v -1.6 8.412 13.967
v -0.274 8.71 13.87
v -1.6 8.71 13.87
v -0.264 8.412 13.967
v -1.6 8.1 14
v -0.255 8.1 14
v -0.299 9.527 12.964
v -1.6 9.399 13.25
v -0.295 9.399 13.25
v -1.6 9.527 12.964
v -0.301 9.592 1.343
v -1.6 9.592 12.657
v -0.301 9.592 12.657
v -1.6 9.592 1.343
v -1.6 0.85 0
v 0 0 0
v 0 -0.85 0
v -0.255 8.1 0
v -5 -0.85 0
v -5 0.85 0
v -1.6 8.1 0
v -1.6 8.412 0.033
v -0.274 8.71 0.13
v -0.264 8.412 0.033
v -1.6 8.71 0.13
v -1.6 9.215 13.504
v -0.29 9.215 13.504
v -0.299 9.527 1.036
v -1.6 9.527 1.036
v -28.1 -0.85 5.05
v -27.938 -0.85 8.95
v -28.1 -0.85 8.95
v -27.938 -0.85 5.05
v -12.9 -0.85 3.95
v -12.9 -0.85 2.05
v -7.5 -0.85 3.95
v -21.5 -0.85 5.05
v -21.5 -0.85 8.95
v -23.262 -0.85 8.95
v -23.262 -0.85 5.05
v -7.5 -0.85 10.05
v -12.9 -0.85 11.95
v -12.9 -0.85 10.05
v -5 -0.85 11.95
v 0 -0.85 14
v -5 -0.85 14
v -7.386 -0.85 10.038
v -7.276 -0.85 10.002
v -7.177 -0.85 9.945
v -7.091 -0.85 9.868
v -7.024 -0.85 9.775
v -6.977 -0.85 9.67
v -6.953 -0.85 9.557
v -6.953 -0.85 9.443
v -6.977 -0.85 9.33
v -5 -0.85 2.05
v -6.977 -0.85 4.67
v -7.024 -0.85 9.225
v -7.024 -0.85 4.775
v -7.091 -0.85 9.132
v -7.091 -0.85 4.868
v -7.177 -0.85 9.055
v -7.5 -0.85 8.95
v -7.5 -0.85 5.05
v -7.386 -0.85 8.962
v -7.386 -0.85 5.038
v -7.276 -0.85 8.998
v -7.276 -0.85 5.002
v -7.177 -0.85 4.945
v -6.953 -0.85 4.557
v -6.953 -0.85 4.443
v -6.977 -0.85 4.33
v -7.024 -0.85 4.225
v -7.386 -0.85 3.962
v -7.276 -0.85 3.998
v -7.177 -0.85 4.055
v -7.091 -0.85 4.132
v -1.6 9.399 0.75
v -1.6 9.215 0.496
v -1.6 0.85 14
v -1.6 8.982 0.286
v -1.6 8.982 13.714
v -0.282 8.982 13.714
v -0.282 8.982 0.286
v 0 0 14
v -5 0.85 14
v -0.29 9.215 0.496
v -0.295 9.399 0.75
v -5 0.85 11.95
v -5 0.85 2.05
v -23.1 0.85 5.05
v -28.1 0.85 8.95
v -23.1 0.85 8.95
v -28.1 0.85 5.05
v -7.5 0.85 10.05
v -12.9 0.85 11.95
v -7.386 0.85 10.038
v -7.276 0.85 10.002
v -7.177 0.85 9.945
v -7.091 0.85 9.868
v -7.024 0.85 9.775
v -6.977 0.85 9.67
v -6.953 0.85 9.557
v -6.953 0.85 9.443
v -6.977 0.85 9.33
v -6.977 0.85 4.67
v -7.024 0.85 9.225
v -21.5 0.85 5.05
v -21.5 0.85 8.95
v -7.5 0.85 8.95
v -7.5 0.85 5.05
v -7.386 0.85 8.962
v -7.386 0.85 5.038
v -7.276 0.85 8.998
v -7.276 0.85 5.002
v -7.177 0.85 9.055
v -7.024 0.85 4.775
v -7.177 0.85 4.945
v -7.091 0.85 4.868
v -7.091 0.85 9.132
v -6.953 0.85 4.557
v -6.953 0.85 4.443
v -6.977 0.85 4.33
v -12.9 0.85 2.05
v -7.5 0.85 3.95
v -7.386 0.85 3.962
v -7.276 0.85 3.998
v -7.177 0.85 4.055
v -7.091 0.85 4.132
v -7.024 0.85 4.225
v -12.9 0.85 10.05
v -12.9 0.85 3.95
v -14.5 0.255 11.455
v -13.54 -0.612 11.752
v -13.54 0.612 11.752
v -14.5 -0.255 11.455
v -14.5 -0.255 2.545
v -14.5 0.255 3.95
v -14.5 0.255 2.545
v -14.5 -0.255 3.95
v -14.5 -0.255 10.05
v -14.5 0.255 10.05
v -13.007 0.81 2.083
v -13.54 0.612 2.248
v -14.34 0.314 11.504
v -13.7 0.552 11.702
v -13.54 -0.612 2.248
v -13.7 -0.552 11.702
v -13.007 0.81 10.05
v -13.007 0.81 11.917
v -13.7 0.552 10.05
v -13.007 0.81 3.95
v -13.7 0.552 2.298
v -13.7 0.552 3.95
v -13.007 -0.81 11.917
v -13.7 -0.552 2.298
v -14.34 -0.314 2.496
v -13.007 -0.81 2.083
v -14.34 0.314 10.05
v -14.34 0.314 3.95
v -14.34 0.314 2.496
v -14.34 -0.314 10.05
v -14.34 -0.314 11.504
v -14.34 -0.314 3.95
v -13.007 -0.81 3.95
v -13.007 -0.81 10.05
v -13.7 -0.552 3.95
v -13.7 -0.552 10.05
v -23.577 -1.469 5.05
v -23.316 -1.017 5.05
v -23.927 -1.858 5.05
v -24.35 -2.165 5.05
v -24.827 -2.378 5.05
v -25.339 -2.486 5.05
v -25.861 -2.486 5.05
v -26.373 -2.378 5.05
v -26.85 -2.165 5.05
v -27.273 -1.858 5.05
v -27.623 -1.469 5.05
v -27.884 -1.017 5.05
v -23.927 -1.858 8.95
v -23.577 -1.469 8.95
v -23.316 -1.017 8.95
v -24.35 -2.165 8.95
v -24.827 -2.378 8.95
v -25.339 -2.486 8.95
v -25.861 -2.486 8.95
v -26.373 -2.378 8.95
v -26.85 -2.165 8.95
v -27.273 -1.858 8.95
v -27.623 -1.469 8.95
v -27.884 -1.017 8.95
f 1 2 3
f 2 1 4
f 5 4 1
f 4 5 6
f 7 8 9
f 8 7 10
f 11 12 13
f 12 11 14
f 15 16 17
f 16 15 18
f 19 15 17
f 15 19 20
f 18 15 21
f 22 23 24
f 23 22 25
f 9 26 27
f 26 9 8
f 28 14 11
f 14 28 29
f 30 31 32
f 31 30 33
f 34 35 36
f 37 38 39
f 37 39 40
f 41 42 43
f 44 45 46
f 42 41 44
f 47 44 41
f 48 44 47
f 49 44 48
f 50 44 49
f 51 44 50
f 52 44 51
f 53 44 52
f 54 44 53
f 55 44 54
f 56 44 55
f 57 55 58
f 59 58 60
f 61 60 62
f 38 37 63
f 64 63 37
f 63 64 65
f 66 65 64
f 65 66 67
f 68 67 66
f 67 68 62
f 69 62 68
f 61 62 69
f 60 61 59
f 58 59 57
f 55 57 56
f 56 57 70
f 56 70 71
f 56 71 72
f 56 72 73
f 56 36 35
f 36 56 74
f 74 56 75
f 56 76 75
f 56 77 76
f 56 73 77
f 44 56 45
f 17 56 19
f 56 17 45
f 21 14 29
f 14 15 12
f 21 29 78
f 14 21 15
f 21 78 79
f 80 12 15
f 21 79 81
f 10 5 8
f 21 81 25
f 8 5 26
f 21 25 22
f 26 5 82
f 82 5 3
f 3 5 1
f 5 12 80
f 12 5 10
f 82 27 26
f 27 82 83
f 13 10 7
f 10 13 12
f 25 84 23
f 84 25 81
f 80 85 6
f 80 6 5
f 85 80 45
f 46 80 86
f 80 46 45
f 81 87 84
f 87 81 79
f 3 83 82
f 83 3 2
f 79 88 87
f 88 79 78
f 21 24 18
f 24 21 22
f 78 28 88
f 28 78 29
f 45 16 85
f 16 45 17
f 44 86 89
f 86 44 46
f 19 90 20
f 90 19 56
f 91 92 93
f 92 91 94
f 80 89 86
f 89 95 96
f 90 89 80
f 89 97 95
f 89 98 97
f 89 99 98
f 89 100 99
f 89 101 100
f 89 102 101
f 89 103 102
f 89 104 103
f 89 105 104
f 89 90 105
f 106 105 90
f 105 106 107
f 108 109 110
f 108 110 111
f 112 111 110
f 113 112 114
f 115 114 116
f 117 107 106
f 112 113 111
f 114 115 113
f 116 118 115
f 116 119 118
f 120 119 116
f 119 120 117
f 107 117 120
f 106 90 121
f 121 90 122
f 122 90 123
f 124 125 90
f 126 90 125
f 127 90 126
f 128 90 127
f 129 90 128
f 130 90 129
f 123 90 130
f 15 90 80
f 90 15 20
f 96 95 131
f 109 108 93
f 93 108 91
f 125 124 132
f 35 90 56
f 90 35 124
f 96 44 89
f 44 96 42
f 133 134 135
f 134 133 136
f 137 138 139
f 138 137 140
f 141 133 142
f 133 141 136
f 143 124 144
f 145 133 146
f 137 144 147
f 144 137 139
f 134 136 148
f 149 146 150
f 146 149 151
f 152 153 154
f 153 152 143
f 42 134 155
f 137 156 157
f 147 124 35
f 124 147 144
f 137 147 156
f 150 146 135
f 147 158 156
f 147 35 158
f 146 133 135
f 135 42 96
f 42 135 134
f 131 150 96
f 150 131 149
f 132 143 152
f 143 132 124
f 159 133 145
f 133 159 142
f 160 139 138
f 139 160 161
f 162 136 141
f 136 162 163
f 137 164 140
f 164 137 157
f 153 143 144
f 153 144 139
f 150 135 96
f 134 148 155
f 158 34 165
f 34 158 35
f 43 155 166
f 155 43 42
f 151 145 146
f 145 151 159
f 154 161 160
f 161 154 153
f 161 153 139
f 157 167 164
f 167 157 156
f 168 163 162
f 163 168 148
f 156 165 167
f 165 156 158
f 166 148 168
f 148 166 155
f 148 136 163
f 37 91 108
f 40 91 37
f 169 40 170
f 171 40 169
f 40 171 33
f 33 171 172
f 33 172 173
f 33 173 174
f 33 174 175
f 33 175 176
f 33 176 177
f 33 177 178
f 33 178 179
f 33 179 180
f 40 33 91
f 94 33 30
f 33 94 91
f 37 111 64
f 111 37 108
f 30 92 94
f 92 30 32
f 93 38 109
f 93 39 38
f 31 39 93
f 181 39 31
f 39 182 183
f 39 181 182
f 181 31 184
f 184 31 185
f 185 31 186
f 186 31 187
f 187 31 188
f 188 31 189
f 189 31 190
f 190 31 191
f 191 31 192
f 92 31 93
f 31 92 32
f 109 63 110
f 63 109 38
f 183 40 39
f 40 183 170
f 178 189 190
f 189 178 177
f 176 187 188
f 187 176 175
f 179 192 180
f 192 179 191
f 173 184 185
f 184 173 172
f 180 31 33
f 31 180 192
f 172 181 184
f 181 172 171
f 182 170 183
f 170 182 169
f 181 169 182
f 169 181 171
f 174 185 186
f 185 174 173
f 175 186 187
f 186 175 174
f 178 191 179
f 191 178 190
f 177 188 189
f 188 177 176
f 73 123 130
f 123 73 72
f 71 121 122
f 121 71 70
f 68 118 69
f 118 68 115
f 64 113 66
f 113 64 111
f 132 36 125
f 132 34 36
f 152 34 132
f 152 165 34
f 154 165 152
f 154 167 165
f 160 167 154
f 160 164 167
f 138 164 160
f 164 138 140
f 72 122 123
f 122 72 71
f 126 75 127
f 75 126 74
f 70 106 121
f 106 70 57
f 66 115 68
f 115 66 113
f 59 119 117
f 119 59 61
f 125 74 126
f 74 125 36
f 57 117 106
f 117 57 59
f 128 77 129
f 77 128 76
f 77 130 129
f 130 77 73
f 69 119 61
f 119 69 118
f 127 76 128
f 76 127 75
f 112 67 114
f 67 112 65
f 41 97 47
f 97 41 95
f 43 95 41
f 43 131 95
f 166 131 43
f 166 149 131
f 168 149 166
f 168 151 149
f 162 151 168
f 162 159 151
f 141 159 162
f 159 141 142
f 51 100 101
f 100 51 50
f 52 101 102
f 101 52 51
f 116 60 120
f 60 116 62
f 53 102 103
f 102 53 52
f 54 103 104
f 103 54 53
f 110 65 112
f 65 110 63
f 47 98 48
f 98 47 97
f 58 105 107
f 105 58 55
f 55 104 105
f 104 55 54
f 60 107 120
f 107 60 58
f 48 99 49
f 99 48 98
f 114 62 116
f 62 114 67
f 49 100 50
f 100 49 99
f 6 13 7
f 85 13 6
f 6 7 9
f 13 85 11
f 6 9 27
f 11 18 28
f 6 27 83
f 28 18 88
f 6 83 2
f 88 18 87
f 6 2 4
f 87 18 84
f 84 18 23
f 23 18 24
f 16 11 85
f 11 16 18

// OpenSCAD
// Hinge lock clip for the Macintosh Portable
// Copyright François Revol, 2025

// [Printing]

print_orientation = 1; // [0: vertical - no support but can break, 1: on the side - needs supports]

optimize_fdm = true;

// [Hidden]
$fn=30;

module hinge_clip() {
    difference() {
        union() {
            // handle
            hull() {
                linear_extrude(1.6) square([14,1.7], center=true);
                for(dx = [-1,1])
                    translate([dx*(14/2-1.5),9.7-1.7/2-1.5/2,0]) cylinder(r=1.5, h=1.6);
            }
            // the clip itself
            linear_extrude(5) square([14,1.7], center=true);
            linear_extrude(14.5-1.6) square([9.9,1.7], center=true);
            translate([0,0,14.5-1.6]) linear_extrude(1.6, scale=[0.9,0.3]) square([9.9,1.7], center=true);
            linear_extrude(28.1) square([3.9,1.7], center=true);
            // bulge
            translate([0,0,28.1-2.5]) rotate([0,90,0]) cylinder(r=2.5,h=3.9, center=true);
        }
        // slight angle on the handle
        rotate([1.8,0,0]) translate([0,10/2,-1/2]) cube([15,10,1], center=true);
        // 2 cuts
        for (dx=[-1,1])
            hull()
                for (dz=[-1,1])
                    translate([dx*(3.9+1.1)/2,0,14.5+dz*7]) rotate([90,0,0]) cylinder(d=1.1,h=3, center=true);
        // only keep one side on the bulge
        translate([0,+2.35,28.1-2.5]) cube([5,3,5], center=true);
        // labels, because why not
        if (!optimize_fdm) difference() {
            hull()
                for(dz=[0,1])
                    translate([0,1.6/2,6+dz*12]) rotate([-90,0,0]) cylinder(d=2.1,h=0.3);
            translate([0,1.6/2-0.2,12]) rotate([-90,-90,0]) linear_extrude(0.5) text("815-1109-REV.", size=1.3, halign="center", valign="center");
        }
        if (!optimize_fdm) difference() {
            translate([0,1.6/2,20.5]) rotate([-90,0,0]) cylinder(d=2.1,h=0.3);
            translate([0,1.6/2-0.2,20.5]) rotate([-90,-90+45,0]) linear_extrude(0.5) text("03", size=1.0, halign="center", valign="center");
        }
        if (!optimize_fdm) difference() {
            for (dx=[-1,1])
                 translate([dx*4,1.6/2,12]) rotate([-90,0,0]) cylinder(d=1.6,h=0.3);
            translate([4,1.6/2-0.2,12]) rotate([-90,-90-45,0]) linear_extrude(0.5) text("A", size=0.9, halign="center", valign="center");
        }
    }
}

p_r = print_orientation == 0 ? [-1.8,0,0]:[0,-90,0];
p_t = print_orientation == 0 ? [0,0,0]:[0,0,14/2];

translate(p_t) rotate(p_r) hinge_clip();
